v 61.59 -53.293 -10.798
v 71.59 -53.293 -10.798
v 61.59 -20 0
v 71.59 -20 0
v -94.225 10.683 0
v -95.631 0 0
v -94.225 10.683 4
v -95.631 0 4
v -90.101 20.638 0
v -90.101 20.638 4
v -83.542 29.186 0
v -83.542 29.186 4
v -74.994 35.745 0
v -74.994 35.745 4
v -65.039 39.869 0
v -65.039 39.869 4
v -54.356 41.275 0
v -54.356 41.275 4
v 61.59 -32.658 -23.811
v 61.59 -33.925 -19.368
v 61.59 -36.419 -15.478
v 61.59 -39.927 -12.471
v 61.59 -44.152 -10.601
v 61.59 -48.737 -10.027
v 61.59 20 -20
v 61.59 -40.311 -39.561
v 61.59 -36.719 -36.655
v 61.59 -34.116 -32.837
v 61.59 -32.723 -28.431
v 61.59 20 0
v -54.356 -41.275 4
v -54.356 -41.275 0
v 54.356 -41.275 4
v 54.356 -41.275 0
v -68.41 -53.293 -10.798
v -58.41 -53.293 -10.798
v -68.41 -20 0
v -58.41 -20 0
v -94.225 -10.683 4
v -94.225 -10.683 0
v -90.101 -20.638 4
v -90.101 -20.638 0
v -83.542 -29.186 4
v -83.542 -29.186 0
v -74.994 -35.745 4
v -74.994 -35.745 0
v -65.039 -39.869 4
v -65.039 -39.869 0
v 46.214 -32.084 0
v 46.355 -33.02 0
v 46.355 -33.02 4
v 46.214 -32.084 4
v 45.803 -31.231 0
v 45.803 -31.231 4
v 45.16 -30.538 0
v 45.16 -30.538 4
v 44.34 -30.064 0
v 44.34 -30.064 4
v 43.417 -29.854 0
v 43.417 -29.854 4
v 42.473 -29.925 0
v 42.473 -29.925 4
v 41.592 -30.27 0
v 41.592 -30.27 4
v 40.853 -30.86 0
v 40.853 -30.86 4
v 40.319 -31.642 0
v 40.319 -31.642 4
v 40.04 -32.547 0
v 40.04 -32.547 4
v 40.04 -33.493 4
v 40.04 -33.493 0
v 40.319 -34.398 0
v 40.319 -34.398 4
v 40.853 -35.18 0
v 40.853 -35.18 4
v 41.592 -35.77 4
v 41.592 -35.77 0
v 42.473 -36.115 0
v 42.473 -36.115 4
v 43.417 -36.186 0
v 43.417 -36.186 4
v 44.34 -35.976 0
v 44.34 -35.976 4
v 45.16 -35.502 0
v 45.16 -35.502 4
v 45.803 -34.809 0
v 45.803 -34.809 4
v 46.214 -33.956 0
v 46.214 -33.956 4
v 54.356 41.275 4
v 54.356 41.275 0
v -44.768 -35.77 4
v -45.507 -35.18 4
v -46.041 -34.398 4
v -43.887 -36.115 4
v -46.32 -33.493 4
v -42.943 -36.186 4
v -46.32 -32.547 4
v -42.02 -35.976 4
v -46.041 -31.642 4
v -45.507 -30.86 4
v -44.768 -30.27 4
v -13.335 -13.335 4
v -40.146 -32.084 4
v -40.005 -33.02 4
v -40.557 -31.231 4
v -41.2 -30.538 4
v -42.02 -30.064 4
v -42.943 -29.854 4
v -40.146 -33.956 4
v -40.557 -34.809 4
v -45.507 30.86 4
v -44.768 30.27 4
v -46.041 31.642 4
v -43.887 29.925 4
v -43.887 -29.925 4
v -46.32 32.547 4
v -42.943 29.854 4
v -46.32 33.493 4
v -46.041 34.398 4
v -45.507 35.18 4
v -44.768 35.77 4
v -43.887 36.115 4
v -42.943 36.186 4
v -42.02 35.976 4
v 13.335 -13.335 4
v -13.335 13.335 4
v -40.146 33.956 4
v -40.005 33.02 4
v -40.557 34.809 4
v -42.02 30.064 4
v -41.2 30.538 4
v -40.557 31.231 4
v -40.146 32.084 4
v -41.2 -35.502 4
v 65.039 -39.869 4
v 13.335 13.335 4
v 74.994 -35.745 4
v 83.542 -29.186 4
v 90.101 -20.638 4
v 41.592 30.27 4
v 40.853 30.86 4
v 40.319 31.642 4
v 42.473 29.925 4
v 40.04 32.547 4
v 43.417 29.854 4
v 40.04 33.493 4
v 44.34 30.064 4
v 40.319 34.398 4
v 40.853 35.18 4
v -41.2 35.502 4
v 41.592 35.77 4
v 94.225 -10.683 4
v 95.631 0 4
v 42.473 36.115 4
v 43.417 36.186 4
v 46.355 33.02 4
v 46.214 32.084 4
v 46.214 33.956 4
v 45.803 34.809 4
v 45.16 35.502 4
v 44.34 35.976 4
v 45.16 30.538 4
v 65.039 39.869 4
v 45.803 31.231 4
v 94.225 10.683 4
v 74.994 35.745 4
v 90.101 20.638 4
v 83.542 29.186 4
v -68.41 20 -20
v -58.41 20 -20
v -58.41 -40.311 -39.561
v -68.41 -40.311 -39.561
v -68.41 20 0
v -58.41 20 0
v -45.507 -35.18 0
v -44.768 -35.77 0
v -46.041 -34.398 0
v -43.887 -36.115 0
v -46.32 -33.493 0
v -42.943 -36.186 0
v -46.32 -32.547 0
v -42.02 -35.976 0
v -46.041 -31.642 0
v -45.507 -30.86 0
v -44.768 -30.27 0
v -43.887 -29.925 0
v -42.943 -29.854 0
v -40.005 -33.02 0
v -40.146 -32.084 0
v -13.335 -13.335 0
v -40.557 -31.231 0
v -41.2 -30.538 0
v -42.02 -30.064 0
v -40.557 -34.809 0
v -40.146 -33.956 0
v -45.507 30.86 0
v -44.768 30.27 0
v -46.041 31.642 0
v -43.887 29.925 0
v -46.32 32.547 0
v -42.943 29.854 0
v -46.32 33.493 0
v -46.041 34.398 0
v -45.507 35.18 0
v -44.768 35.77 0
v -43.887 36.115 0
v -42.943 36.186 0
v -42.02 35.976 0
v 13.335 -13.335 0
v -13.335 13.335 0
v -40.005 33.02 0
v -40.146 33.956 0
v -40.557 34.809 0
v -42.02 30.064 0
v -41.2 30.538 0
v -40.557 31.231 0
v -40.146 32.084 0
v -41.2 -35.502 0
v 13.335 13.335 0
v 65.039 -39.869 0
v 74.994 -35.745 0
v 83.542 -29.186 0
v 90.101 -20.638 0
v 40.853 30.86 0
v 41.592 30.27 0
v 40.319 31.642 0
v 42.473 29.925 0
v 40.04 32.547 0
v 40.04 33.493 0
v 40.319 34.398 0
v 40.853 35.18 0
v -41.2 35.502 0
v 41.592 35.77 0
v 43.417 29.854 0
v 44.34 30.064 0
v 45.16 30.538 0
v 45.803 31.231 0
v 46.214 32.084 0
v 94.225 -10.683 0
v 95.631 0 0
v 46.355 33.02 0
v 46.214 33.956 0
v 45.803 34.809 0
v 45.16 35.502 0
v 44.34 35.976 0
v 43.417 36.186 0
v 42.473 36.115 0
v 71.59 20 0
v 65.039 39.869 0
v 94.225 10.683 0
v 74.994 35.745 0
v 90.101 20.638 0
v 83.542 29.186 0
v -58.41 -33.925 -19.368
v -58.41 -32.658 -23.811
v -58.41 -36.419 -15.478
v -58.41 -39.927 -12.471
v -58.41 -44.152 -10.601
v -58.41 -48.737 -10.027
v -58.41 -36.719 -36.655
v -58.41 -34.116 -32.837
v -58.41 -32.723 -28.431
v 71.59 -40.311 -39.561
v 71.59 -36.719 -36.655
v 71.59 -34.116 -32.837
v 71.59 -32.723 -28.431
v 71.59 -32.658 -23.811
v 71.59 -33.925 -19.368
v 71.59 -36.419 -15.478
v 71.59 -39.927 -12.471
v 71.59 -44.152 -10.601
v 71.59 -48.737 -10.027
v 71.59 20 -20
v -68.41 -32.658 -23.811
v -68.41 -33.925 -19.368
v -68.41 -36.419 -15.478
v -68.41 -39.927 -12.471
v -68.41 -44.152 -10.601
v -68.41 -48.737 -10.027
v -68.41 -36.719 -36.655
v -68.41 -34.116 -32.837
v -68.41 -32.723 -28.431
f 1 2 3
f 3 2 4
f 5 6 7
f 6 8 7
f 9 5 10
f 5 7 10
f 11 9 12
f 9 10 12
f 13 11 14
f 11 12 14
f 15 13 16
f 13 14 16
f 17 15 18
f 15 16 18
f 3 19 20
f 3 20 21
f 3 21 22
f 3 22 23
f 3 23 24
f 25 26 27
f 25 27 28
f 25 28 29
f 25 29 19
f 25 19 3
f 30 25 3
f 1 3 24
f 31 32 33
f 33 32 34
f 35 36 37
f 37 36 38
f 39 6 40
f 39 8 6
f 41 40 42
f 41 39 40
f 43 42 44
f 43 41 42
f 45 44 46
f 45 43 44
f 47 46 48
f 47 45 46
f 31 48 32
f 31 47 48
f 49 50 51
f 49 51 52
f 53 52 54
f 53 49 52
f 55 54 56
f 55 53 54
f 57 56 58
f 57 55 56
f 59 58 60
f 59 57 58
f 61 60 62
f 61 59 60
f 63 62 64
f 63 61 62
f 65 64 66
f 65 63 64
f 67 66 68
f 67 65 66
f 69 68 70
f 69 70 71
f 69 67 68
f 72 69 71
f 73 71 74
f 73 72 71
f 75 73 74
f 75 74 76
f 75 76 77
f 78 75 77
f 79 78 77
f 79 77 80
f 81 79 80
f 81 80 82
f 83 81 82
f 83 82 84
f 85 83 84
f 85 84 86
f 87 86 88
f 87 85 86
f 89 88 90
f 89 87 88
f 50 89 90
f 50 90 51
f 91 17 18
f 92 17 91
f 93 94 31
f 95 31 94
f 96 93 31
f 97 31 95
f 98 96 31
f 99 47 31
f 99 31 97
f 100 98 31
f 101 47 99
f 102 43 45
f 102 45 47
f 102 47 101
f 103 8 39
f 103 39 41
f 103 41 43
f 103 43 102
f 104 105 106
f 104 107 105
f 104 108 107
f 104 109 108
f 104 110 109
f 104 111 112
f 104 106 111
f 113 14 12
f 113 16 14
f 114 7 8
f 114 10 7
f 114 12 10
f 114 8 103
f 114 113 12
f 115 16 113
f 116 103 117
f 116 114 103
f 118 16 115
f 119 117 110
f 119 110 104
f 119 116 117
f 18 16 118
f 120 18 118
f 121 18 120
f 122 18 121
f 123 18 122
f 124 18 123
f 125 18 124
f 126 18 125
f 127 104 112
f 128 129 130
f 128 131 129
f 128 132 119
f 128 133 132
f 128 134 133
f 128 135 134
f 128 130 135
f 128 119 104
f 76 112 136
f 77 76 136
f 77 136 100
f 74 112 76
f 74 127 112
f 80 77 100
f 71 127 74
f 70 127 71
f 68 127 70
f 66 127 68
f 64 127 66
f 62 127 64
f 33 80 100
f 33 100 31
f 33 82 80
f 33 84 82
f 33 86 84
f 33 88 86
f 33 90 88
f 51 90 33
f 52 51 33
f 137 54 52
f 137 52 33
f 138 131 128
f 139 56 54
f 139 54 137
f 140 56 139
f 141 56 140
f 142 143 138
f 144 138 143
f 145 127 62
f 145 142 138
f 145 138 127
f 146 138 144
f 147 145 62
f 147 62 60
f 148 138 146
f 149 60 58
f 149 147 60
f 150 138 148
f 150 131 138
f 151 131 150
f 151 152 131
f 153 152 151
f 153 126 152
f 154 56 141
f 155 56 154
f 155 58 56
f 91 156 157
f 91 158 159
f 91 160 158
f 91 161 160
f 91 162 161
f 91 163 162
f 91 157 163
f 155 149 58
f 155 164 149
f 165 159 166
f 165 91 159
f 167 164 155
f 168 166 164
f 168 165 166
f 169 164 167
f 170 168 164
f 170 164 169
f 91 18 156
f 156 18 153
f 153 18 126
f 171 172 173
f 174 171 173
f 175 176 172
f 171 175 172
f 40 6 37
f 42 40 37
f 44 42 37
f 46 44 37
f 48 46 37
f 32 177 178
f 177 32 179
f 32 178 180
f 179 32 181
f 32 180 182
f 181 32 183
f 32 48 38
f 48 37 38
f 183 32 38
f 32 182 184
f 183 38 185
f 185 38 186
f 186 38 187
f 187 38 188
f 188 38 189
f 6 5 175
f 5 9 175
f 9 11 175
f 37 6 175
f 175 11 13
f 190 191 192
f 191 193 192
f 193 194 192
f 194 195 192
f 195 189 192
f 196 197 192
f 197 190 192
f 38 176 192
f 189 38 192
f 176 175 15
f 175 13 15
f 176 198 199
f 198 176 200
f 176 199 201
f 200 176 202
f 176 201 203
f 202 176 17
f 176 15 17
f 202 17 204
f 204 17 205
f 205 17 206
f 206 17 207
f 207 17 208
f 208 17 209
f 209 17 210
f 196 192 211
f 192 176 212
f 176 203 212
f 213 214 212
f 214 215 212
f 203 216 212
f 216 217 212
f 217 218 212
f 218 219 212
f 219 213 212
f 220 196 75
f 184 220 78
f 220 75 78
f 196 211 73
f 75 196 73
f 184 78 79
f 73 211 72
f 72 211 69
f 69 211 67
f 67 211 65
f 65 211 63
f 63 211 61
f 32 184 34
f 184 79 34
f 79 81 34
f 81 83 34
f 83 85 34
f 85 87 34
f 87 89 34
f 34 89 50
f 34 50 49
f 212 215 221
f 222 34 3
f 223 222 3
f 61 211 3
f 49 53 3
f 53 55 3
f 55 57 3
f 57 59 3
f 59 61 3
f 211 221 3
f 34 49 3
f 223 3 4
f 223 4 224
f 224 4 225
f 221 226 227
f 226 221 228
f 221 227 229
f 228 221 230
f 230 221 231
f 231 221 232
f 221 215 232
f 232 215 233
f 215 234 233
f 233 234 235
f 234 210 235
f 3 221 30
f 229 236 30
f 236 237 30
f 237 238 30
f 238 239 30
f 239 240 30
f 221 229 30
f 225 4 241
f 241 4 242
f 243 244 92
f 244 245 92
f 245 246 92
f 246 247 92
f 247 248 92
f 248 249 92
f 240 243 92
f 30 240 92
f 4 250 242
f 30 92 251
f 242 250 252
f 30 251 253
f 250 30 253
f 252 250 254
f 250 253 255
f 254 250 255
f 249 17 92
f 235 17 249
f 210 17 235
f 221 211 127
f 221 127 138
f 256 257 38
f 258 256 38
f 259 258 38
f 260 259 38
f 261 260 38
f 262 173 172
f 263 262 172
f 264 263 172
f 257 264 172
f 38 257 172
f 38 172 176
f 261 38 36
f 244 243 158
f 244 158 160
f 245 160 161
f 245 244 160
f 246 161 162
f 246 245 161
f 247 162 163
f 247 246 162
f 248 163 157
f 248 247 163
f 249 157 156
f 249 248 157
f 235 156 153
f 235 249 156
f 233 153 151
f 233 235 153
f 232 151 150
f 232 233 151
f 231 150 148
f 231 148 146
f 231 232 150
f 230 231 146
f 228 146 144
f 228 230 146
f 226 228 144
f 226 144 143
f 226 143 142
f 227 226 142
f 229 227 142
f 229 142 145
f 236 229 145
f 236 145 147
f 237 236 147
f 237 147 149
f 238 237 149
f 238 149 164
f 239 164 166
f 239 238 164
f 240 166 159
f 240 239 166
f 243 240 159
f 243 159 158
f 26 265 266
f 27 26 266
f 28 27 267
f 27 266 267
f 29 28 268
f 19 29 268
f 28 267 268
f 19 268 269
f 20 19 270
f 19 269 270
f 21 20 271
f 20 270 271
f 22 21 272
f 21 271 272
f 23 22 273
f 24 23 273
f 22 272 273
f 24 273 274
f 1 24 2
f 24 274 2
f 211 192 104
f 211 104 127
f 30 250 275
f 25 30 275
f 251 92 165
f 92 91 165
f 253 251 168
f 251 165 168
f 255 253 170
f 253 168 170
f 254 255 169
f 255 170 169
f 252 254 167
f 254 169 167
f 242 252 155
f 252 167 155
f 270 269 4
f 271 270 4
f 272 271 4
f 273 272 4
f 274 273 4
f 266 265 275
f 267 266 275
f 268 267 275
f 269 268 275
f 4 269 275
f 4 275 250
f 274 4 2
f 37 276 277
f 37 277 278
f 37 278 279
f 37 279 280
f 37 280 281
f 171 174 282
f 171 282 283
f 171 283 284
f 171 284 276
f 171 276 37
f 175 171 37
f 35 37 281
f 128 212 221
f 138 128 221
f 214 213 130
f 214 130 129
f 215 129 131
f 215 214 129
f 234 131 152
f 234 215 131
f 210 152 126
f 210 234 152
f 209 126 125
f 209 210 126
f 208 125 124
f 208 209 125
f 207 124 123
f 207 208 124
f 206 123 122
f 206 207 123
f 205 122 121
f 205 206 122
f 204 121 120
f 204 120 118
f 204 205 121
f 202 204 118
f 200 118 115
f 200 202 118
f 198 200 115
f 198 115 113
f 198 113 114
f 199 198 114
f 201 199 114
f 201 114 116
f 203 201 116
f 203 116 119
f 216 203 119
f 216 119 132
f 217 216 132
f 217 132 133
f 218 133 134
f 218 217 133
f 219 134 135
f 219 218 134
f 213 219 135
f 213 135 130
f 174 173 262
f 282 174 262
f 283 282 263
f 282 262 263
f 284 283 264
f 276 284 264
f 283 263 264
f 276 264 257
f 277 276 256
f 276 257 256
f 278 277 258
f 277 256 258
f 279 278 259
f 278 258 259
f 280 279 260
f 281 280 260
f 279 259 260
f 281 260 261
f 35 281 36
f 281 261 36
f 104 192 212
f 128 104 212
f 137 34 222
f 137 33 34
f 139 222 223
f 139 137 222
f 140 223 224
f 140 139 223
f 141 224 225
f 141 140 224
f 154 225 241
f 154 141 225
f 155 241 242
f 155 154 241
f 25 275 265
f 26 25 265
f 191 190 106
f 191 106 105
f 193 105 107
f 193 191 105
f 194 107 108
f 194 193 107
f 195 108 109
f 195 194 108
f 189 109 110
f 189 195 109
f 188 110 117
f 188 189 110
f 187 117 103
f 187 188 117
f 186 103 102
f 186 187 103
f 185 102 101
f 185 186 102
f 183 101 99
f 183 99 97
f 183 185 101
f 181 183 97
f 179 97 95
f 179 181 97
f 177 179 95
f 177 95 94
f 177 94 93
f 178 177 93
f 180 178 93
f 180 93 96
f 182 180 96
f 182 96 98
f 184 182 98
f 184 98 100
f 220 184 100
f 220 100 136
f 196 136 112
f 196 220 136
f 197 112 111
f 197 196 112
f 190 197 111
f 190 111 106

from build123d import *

# Parameters (mm, degrees)
SKETCH1_W           = 191.262
SKETCH1_H           = 82.55
SKETCH1_R           = 3.175
SKETCH1_W_2         = 26.67
SKETCH1_H_2         = 26.67
BOSS_EXTRUDE1_DEPTH = 4
FILLET5_R           = 41.275
BOSS_EXTRUDE2_DEPTH = 10
LPATTERN1_COUNT     = 2
LPATTERN1_PITCH     = 130


with BuildPart() as part:
    # Sketch1 → Boss-Extrude1 (new body)
    with BuildSketch(Plane.XY):
        Rectangle(SKETCH1_W, SKETCH1_H)
        with Locations((-43.18, 33.02)):
            Circle(SKETCH1_R, mode=Mode.SUBTRACT)
        with Locations((43.18, 33.02)):
            Circle(SKETCH1_R, mode=Mode.SUBTRACT)
        with Locations((43.18, -33.02)):
            Circle(SKETCH1_R, mode=Mode.SUBTRACT)
        with Locations((-43.18, -33.02)):
            Circle(SKETCH1_R, mode=Mode.SUBTRACT)
        Rectangle(SKETCH1_W_2, SKETCH1_H_2, mode=Mode.SUBTRACT)
    extrude(amount=BOSS_EXTRUDE1_DEPTH)

    # Fillet5
    fillet5_edges = [part.edges().sort_by_distance(p)[0] for p in [
        (-95.631, -41.275, 2),
        (95.631, -41.275, 2),
        (95.631, 41.275, 2),
        (-95.631, 41.275, 2),
    ]]
    fillet(fillet5_edges, radius=FILLET5_R - 0.0001)  # a hair under: the kernel refuses the full size

    # Sketch2 → Boss-Extrude2 (add)
    with BuildSketch(Plane(origin=(71.59, 0, 0), x_dir=(0, 0, -1), z_dir=(1, 0, 0))):
        with BuildLine():
            Line((0, 20), (20, 20))
            Line((20, 20), (39.561185263, -40.310839577))
            ThreePointArc((39.561185263, -40.310839577), (19.368102567, -33.925421898), (10.798120439, -53.292650765))
            Line((10.798120439, -53.292650765), (0, -20))
            Line((0, -20), (0, 20))
        make_face()
    boss_extrude2 = extrude(amount=-BOSS_EXTRUDE2_DEPTH)

    # LPattern1: Boss-Extrude2 ×2
    with Locations(*[(-i * LPATTERN1_PITCH, 0, 0) for i in range(1, LPATTERN1_COUNT)]):
        add(boss_extrude2)


solid = part.part
